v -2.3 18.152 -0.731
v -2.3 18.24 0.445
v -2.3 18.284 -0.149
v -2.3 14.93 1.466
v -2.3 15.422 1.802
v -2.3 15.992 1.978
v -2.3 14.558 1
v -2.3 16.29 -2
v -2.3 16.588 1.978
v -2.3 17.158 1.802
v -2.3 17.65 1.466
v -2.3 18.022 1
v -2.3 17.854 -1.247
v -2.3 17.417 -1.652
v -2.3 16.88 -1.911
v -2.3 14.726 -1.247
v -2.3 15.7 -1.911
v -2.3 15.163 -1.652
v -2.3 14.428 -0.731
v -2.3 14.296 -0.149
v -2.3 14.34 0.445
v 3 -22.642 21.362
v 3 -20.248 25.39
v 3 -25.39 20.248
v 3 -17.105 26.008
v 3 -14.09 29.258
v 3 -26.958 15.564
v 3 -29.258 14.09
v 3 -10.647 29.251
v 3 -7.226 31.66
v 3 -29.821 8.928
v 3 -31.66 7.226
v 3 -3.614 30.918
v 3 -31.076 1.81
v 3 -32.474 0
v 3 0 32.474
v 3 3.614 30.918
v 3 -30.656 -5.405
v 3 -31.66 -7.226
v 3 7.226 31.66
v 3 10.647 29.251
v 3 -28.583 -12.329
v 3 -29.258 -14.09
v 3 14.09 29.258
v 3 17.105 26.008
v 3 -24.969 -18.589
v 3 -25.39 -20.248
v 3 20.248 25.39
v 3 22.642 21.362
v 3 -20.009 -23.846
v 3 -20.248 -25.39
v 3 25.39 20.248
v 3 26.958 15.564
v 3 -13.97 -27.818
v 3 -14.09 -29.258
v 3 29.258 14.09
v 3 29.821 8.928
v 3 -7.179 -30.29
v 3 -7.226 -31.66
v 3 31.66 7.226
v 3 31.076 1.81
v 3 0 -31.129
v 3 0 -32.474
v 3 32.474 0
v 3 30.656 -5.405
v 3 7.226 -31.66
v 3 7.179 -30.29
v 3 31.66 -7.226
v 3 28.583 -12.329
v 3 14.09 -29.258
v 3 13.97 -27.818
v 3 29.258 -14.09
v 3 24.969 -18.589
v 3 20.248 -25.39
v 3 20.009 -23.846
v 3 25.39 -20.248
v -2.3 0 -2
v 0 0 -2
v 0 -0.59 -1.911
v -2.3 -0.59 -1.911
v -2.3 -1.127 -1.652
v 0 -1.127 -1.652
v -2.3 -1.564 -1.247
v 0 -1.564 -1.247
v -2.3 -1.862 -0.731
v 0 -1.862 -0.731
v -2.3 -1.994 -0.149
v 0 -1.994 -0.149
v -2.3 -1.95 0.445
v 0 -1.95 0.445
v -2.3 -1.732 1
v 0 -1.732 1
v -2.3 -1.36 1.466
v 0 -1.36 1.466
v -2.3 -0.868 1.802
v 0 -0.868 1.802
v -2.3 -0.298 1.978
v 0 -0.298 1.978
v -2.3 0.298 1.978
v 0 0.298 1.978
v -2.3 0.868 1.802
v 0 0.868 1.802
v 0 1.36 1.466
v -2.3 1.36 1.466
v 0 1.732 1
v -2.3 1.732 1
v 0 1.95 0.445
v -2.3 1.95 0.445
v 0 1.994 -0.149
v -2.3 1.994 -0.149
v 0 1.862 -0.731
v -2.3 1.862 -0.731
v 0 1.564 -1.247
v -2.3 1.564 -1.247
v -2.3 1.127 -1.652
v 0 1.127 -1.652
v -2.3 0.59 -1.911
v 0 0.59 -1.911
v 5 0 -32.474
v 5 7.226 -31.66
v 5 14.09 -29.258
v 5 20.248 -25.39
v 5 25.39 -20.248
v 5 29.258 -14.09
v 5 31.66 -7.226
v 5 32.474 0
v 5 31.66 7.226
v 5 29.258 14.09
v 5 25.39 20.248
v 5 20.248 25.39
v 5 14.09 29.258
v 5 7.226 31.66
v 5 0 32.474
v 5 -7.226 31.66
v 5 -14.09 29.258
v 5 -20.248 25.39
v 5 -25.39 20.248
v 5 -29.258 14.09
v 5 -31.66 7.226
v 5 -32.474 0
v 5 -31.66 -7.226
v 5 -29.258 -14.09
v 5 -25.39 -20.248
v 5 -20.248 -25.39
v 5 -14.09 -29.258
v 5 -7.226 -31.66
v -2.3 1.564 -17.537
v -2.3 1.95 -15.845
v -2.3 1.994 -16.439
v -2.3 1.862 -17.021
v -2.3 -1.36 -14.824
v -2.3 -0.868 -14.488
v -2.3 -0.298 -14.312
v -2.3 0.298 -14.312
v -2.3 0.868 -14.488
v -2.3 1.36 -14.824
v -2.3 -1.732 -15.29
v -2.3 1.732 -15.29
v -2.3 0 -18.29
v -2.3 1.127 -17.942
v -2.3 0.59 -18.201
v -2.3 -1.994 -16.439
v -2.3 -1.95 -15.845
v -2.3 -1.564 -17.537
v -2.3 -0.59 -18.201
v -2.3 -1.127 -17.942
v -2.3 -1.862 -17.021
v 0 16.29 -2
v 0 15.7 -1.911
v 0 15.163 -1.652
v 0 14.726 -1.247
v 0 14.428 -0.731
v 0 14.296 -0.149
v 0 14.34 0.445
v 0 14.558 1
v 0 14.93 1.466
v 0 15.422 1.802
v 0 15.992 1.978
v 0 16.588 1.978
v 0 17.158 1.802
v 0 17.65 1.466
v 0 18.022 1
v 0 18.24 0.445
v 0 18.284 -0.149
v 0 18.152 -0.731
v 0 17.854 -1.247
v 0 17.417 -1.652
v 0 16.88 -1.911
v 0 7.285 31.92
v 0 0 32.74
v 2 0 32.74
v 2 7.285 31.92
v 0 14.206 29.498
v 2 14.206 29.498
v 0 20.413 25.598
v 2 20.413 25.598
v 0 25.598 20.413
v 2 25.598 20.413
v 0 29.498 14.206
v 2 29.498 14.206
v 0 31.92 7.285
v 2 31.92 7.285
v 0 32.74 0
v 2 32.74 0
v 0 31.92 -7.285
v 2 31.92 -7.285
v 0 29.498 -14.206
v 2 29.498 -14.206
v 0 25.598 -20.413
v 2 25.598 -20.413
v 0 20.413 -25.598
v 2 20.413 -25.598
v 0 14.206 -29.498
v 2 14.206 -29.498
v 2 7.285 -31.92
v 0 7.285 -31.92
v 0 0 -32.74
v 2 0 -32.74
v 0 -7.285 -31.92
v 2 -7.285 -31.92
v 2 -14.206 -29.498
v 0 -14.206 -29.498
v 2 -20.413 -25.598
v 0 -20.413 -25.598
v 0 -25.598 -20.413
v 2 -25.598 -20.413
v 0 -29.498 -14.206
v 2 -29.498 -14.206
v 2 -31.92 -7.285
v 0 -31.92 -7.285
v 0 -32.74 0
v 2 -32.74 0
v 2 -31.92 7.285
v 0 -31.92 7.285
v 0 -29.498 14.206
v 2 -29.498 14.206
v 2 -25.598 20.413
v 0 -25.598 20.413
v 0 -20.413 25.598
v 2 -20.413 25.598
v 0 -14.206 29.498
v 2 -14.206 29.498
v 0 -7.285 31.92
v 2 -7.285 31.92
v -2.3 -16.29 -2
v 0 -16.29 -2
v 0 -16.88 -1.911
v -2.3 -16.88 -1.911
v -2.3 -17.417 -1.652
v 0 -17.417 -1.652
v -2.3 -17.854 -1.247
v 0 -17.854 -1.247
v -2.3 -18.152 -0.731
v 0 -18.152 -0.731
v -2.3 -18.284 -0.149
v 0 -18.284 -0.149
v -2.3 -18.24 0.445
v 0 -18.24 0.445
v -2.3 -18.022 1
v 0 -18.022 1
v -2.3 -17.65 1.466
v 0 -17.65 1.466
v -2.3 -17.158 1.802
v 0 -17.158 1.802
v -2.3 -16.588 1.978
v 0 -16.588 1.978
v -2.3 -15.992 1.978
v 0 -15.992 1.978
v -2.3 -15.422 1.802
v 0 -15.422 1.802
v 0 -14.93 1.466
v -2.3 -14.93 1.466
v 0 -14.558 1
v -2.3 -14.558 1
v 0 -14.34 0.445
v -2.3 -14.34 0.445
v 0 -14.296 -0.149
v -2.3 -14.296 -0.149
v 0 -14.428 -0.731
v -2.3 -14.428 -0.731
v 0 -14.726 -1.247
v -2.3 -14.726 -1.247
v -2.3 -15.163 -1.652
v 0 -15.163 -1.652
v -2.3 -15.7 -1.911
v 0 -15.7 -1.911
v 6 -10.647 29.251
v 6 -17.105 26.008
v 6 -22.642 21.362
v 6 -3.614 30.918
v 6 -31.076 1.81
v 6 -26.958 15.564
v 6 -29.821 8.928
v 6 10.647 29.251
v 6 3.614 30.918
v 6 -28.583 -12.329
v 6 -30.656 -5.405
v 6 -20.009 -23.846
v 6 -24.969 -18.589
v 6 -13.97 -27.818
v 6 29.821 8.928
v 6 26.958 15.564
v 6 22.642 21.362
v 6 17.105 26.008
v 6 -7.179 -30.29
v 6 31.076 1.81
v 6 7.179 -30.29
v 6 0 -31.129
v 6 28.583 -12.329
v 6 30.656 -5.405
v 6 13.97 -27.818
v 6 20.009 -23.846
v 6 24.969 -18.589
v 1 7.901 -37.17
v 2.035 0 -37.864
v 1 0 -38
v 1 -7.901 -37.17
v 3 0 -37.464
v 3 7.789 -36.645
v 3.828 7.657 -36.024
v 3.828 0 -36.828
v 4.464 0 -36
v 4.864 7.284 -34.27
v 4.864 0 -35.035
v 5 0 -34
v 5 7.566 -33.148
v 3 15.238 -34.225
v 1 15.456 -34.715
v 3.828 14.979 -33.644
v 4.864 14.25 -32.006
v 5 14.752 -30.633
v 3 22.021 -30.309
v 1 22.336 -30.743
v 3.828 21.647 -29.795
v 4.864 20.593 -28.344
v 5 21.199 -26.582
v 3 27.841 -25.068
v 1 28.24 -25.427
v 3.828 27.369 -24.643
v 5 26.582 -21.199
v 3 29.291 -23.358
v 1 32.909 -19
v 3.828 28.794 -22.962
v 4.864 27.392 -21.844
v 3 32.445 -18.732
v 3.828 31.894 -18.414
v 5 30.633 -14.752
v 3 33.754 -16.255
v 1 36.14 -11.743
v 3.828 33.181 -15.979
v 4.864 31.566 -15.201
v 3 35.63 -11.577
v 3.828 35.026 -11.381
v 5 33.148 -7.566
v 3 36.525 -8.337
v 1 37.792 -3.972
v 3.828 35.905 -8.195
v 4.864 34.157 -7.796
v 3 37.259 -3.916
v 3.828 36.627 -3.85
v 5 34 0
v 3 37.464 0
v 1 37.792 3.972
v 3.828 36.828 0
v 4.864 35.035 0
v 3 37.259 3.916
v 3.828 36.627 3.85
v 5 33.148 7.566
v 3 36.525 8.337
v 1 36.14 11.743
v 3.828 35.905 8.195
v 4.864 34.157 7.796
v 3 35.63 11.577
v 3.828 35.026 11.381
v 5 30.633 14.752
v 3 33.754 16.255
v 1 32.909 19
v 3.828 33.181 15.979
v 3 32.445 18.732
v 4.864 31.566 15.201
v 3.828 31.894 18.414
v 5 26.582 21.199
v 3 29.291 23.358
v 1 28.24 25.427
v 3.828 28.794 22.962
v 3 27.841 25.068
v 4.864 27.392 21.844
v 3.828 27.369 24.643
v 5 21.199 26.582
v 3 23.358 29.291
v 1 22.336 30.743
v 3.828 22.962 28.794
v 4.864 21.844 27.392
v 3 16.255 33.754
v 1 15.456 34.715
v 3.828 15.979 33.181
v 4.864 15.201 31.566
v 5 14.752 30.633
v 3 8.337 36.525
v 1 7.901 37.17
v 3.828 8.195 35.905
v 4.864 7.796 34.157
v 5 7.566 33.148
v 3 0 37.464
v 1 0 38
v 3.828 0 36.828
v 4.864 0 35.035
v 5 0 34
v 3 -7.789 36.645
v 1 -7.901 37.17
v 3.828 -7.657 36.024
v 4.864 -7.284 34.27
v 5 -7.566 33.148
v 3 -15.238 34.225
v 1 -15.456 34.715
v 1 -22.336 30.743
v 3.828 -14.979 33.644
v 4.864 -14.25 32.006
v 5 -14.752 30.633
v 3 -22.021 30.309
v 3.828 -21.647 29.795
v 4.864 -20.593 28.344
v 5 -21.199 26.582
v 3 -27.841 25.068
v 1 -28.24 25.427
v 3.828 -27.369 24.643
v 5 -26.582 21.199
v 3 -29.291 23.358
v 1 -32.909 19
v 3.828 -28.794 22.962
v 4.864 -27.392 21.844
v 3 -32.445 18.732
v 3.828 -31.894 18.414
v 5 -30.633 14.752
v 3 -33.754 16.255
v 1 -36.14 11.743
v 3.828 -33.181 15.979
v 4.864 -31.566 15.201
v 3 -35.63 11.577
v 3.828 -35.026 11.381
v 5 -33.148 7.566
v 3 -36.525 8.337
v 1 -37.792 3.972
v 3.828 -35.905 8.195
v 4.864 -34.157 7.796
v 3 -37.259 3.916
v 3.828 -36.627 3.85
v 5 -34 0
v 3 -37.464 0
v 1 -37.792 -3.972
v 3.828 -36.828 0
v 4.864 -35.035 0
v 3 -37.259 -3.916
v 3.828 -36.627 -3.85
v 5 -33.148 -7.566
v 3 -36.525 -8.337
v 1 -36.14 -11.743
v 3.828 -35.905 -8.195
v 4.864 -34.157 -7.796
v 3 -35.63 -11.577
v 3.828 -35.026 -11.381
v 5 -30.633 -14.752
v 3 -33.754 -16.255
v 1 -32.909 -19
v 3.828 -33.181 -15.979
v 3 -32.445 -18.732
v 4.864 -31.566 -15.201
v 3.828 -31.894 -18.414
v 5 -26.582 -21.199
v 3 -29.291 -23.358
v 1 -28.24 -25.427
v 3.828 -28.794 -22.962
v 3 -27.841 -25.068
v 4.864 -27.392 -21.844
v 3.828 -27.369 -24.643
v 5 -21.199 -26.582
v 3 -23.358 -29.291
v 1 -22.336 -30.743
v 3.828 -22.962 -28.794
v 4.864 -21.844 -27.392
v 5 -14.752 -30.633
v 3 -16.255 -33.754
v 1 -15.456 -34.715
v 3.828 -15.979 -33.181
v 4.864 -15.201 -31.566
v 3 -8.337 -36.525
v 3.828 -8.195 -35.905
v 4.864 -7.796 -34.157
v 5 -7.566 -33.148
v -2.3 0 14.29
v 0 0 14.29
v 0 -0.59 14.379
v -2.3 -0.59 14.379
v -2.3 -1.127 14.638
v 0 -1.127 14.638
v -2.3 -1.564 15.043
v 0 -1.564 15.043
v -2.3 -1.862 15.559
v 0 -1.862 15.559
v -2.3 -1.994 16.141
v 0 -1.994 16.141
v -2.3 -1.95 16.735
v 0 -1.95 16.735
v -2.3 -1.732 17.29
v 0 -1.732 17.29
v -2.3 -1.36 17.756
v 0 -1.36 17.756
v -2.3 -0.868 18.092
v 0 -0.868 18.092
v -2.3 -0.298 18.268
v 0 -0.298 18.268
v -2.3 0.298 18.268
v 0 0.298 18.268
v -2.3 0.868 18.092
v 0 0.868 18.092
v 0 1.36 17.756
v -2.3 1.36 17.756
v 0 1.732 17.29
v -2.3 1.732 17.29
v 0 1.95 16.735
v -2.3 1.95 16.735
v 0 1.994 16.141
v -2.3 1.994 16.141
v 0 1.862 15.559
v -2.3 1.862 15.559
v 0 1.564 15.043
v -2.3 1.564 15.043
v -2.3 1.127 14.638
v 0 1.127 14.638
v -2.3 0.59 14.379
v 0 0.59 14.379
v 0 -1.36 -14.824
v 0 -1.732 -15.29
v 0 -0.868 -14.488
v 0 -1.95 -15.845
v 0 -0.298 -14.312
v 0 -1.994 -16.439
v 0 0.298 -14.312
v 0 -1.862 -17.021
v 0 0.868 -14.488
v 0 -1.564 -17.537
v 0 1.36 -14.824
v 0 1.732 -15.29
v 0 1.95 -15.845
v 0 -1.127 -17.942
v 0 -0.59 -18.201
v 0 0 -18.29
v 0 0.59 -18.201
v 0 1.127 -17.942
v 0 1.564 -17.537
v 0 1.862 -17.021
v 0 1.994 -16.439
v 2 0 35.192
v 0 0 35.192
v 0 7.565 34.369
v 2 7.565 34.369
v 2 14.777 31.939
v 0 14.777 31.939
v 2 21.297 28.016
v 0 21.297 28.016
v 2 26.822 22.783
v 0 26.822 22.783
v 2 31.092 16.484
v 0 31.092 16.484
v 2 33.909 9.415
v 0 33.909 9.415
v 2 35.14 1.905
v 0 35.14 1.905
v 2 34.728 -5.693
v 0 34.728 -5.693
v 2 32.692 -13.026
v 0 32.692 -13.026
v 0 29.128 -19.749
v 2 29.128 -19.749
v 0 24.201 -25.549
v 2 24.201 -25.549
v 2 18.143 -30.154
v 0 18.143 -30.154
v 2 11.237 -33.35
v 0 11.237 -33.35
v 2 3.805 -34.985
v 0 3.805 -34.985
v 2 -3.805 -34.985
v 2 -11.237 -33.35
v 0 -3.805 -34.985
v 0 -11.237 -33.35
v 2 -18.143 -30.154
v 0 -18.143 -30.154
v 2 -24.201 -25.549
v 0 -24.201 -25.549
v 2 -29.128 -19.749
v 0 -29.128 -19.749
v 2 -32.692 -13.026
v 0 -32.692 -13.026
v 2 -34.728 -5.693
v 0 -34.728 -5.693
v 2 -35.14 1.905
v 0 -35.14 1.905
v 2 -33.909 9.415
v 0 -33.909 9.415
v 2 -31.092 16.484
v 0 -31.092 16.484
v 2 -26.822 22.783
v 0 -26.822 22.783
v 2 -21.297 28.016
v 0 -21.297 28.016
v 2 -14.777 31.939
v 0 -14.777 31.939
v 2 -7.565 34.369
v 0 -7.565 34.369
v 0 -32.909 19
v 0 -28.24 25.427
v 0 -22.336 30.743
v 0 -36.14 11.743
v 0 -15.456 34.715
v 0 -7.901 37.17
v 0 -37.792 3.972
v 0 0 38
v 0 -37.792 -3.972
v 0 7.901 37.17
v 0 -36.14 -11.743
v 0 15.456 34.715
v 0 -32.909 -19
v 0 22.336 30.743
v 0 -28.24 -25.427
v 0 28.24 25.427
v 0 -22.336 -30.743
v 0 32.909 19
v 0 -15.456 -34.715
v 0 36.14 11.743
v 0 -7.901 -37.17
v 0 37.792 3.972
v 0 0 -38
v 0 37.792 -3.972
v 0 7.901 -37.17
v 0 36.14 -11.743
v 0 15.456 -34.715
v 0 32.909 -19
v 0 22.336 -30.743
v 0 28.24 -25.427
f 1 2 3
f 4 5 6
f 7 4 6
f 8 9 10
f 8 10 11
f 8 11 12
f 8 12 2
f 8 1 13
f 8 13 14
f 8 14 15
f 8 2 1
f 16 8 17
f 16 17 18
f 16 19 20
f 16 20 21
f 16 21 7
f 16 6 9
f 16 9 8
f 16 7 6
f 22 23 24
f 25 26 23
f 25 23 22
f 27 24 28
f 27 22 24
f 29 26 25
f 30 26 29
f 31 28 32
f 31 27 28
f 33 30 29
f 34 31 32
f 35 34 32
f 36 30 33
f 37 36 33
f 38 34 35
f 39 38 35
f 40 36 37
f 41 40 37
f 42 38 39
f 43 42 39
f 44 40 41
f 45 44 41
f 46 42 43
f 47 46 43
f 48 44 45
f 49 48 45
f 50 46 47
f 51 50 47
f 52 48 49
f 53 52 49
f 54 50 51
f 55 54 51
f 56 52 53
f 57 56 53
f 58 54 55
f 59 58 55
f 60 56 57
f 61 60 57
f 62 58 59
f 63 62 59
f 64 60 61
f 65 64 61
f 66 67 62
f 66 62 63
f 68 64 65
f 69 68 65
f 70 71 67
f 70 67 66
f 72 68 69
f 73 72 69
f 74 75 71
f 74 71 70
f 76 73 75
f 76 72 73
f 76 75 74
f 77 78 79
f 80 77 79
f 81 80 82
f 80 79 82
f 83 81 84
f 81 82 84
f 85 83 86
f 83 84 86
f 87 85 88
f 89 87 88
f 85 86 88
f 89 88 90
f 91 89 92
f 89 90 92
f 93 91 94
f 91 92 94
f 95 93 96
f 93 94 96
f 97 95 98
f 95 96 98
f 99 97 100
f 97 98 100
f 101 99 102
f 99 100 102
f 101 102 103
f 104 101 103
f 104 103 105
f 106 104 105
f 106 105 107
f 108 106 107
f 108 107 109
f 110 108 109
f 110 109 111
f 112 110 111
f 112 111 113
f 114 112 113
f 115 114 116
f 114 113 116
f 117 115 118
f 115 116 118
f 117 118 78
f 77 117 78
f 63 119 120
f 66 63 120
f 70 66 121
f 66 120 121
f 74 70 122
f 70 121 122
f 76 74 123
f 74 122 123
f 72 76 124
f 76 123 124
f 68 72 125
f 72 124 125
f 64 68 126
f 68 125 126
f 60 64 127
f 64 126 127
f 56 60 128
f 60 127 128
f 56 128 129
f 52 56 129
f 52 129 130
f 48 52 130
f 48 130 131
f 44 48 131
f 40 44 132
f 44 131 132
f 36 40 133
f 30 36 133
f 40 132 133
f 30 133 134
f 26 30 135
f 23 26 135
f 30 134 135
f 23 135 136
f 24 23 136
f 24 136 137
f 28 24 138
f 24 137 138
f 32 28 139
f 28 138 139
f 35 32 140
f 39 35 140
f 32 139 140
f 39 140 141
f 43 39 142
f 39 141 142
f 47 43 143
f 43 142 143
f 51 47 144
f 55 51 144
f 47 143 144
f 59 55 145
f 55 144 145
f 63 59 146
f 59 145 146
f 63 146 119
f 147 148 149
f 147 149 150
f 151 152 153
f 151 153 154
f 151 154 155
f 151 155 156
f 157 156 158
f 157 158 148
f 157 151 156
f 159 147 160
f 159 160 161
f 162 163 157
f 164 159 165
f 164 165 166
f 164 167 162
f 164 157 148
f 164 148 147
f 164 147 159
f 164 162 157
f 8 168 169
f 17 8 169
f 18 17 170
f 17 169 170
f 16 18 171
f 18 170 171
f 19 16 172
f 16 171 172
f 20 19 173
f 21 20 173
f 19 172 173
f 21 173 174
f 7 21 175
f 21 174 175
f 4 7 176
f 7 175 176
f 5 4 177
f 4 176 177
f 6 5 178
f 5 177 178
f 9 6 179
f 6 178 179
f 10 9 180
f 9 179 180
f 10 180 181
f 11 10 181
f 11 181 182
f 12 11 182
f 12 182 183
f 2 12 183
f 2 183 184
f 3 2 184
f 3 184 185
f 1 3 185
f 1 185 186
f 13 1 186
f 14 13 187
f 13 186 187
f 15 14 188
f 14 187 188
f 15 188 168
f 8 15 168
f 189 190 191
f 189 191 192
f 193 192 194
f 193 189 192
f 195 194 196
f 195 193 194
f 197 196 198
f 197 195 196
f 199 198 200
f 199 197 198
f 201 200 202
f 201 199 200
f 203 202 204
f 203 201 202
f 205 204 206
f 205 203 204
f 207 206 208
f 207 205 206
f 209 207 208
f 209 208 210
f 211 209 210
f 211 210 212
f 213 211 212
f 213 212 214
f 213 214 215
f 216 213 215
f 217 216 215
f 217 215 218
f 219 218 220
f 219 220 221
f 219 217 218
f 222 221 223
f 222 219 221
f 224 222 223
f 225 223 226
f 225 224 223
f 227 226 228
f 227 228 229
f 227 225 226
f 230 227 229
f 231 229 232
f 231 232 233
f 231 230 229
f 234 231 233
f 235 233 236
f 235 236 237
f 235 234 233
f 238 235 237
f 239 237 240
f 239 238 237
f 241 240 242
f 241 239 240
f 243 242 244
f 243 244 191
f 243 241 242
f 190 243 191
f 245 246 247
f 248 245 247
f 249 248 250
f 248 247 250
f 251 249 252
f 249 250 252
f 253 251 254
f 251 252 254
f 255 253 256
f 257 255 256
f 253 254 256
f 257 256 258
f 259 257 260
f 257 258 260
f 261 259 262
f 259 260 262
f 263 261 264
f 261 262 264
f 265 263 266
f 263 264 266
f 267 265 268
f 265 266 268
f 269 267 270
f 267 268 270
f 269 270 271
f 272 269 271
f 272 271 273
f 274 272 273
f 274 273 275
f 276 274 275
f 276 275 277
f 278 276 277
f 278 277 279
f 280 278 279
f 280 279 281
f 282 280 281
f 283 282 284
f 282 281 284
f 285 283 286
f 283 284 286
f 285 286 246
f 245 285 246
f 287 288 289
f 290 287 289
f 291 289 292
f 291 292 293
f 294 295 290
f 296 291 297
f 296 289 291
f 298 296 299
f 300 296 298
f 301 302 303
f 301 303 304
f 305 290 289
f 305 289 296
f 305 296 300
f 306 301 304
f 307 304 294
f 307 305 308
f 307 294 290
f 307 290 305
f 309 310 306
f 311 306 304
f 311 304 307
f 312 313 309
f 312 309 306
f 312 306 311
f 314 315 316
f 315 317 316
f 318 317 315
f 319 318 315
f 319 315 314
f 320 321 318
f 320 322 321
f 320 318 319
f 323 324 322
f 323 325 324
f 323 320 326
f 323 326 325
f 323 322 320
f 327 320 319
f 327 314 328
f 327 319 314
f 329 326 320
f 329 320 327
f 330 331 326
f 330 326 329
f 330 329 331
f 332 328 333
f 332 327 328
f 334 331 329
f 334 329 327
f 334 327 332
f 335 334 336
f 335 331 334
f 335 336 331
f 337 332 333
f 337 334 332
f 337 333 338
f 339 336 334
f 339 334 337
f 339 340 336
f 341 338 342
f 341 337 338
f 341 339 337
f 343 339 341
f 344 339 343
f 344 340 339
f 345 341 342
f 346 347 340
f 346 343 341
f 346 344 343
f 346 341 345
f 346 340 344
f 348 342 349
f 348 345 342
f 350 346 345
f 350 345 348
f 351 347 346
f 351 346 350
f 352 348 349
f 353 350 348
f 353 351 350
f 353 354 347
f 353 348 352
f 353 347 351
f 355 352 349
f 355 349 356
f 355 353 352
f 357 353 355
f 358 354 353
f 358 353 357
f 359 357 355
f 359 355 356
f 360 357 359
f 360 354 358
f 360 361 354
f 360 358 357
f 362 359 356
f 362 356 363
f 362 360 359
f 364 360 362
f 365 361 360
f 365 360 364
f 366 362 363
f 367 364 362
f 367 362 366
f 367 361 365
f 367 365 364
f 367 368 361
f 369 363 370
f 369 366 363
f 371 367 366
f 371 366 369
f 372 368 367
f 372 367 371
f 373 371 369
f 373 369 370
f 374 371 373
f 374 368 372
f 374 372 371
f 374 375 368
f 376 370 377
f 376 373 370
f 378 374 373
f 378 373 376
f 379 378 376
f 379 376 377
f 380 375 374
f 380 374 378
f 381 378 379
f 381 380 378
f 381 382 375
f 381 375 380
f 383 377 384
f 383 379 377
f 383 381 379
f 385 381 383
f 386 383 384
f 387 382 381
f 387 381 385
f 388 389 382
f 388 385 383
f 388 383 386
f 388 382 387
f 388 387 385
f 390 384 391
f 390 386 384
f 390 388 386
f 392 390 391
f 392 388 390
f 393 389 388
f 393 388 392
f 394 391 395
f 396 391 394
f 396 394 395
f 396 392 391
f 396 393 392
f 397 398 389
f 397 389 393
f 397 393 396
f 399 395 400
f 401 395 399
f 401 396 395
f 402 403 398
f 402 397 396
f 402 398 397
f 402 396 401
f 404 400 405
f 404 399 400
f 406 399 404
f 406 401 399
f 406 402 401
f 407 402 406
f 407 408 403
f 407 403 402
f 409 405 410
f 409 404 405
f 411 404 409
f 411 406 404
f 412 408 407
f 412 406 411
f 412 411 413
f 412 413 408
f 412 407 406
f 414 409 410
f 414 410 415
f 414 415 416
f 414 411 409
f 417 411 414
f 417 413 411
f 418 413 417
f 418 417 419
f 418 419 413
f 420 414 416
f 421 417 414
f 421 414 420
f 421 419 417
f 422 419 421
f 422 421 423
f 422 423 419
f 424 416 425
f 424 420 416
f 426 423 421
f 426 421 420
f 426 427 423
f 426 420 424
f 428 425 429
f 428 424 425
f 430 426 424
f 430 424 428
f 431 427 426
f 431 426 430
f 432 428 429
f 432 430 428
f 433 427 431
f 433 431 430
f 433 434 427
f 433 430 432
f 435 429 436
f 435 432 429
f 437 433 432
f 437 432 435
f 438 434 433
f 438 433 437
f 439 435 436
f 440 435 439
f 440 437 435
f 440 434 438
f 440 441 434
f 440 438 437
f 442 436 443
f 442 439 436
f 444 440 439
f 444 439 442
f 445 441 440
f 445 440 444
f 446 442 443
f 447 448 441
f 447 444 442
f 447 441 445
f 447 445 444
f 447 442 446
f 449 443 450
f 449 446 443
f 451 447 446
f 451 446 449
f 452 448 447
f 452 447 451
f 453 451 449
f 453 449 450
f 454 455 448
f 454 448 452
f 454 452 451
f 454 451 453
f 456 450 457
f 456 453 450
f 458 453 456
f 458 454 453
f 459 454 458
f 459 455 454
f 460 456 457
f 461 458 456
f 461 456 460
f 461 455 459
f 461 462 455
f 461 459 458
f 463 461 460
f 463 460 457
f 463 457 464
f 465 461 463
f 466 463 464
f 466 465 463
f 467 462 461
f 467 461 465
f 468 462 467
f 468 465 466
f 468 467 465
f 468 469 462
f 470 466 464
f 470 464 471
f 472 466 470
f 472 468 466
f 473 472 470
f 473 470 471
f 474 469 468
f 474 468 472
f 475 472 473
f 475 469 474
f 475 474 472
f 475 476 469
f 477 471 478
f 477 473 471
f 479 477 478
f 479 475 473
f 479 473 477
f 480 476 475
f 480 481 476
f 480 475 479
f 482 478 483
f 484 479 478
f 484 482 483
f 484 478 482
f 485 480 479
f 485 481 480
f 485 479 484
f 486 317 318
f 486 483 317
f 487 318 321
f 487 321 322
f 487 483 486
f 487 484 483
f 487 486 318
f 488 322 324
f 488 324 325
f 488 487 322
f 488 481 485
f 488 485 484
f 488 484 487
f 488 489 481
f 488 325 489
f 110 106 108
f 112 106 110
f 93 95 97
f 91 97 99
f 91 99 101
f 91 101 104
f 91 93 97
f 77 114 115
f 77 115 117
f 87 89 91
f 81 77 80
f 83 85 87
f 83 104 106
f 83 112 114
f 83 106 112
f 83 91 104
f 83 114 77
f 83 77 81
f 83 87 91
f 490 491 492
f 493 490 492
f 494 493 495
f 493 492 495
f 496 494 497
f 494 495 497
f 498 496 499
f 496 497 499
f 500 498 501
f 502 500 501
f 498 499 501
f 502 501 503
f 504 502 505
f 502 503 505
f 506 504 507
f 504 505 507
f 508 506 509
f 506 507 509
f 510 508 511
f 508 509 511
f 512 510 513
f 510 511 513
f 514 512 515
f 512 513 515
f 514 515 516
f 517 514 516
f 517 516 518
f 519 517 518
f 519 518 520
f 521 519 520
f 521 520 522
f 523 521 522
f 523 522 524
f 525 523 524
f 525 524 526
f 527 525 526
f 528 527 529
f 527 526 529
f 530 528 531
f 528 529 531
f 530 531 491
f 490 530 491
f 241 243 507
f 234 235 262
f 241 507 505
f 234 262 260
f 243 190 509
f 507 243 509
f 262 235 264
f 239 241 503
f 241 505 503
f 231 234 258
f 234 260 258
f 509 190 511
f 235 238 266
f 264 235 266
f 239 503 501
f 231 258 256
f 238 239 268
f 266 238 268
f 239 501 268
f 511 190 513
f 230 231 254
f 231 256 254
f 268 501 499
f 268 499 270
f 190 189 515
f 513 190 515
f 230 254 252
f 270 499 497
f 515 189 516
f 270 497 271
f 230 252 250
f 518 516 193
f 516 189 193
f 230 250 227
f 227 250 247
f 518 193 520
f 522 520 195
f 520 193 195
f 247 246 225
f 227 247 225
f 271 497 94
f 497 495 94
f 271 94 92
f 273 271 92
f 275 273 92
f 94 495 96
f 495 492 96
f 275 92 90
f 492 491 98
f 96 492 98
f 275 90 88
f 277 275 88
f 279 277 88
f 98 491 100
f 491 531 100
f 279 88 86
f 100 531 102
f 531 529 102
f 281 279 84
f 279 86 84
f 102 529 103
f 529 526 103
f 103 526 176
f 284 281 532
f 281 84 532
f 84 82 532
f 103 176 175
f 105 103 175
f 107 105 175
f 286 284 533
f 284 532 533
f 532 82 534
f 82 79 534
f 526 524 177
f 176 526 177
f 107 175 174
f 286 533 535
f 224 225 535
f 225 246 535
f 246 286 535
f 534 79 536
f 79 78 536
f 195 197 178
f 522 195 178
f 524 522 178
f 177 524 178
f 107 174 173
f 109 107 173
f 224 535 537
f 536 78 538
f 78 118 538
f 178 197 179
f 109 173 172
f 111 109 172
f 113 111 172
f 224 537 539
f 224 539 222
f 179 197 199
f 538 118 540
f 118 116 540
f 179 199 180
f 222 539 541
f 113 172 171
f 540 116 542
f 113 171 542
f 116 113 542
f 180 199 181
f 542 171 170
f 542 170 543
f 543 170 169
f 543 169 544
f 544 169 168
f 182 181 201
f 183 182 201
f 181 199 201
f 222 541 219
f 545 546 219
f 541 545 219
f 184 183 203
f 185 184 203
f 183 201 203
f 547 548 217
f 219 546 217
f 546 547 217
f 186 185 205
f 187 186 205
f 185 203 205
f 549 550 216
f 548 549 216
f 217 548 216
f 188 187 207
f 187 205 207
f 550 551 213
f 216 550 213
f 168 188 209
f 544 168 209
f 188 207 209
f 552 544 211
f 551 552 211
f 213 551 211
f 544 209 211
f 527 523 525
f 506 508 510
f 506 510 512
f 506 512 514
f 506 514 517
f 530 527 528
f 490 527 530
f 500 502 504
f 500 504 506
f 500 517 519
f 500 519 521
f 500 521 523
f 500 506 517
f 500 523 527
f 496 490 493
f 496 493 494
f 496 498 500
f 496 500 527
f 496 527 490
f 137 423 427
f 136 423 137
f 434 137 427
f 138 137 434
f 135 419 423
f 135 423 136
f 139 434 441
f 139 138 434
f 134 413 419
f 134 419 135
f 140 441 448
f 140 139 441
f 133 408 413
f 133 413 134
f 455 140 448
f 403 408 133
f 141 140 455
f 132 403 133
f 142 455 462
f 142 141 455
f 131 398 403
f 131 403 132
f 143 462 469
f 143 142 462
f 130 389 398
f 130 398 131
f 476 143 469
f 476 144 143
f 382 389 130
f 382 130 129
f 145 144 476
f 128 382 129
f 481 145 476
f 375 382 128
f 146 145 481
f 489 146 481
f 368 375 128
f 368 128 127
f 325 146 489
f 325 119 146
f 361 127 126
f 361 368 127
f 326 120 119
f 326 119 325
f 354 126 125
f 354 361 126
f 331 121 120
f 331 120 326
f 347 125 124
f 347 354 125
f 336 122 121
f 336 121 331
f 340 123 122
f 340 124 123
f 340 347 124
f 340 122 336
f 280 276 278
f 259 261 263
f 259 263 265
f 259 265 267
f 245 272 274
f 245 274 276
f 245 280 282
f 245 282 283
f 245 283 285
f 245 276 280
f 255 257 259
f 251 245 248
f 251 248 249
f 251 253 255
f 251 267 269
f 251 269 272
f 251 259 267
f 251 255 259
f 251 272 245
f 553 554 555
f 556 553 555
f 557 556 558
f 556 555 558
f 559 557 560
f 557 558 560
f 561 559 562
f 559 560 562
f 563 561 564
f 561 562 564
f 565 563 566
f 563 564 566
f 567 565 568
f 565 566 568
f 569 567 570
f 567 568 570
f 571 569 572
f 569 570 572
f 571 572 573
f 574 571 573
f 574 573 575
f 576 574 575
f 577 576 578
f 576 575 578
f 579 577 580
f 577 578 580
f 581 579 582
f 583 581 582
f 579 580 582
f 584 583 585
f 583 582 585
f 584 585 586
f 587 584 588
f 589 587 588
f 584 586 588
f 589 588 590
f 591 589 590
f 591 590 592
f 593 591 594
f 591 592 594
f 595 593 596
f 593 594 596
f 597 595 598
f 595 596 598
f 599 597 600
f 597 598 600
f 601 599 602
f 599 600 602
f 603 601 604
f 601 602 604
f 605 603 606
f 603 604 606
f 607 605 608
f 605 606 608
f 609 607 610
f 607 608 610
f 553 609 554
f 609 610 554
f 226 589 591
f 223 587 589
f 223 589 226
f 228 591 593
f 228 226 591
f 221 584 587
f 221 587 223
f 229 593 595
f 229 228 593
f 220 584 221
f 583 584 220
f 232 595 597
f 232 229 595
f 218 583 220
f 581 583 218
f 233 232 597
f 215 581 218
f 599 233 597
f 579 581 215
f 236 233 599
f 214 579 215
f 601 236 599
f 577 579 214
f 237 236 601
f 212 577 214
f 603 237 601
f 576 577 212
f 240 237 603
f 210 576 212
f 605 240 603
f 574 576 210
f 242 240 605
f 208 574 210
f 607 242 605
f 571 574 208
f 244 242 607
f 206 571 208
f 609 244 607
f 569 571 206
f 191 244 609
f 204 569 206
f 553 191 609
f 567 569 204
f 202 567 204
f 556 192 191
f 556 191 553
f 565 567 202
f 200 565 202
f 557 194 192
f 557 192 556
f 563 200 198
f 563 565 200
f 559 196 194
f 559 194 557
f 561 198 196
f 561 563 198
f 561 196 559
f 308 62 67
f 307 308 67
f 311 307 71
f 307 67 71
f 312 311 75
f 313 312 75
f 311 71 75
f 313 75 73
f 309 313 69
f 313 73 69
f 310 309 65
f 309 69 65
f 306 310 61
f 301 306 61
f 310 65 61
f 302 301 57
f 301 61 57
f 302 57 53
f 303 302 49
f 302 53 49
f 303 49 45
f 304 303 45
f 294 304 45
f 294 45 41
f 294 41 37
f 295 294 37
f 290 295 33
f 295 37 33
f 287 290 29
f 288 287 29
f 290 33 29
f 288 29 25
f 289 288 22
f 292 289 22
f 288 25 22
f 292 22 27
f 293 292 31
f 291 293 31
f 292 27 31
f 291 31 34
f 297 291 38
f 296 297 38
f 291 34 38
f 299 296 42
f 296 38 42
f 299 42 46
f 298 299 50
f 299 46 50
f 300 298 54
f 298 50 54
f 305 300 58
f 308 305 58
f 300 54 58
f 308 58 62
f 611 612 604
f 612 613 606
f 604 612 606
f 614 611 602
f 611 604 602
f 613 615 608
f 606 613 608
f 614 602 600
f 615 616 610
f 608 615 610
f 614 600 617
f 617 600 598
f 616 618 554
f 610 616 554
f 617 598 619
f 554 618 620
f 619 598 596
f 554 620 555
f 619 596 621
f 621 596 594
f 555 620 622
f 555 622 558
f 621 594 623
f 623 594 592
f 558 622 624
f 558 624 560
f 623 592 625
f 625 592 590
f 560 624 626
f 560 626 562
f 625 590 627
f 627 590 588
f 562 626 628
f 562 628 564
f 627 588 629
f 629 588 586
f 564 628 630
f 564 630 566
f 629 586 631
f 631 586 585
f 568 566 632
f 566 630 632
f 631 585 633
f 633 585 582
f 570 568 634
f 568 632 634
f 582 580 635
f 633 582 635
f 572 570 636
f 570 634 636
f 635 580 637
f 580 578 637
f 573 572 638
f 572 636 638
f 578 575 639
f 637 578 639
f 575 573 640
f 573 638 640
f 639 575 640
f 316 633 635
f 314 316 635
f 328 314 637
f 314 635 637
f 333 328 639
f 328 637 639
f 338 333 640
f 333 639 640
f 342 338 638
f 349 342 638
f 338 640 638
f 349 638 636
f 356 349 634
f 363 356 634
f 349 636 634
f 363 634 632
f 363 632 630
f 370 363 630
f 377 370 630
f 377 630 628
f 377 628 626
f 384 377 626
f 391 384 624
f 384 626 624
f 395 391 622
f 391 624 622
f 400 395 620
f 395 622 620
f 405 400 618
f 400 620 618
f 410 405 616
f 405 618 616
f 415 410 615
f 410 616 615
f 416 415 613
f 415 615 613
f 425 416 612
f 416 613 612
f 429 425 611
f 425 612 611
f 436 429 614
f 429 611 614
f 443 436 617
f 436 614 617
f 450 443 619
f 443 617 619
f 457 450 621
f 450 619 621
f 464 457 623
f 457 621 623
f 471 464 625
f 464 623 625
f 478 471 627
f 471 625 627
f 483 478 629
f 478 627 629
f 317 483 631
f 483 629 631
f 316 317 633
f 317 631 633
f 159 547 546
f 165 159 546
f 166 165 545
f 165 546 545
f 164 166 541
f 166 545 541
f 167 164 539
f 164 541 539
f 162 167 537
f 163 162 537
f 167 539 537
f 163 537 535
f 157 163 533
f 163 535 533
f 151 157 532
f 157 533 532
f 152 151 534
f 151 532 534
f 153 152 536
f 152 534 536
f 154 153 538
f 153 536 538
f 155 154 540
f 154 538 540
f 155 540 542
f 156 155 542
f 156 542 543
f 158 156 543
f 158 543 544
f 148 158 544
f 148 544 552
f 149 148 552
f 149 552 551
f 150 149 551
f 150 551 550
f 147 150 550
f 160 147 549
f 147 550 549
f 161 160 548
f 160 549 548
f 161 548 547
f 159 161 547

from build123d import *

# Parameters (mm, degrees)
SKETCH1_R           = 38
BOSS_EXTRUDE1_DEPTH = 5
FILLET1_R           = 4
SKETCH2_R           = 2
BOSS_EXTRUDE2_DEPTH = 2.3
SKETCH3_R           = 32.474473425
CUT_EXTRUDE1_DEPTH  = 2
SKETCH4_R           = 35.191697817
SKETCH4_R_2         = 32.740433986
CUT_EXTRUDE2_DEPTH  = 2
SKETCH5_R           = 31.128585578
BOSS_EXTRUDE3_DEPTH = 3


with BuildPart() as part:
    # Sketch1 → Boss-Extrude1 (new body)
    with BuildSketch(Plane(origin=(0, 0, 0), x_dir=(0, 0, -1), z_dir=(1, 0, 0))):
        Circle(SKETCH1_R)
    extrude(amount=BOSS_EXTRUDE1_DEPTH)

    # Fillet1
    fillet1_edges = [part.edges().sort_by_distance(p)[0] for p in [
        (5, 0, 38),
    ]]
    fillet(fillet1_edges, radius=FILLET1_R)

    # Sketch2 → Boss-Extrude2 (add)
    with BuildSketch(Plane.ZY):
        with Locations(Location((0, 0, 0), (0, 0, 180))):
            Circle(SKETCH2_R)
        with Locations(Location((0, 16.29, 0), (0, 0, 180))):
            Circle(SKETCH2_R)
        with Locations(Location((16.29, 0, 0), (0, 0, 180))):
            Circle(SKETCH2_R)
        with Locations(Location((-16.29, 0, 0), (0, 0, 180))):
            Circle(SKETCH2_R)
        with Locations(Location((0, -16.29, 0), (0, 0, 180))):
            Circle(SKETCH2_R)
    extrude(amount=BOSS_EXTRUDE2_DEPTH)

    # Sketch3 → Cut-Extrude1 (cut)
    with BuildSketch(Plane(origin=(5, 0, 0), x_dir=(0, 0, -1), z_dir=(1, 0, 0))):
        Circle(SKETCH3_R)
    extrude(amount=-CUT_EXTRUDE1_DEPTH, mode=Mode.SUBTRACT)

    # Sketch4 → Cut-Extrude2 (cut)
    with BuildSketch(Plane.ZY):
        Circle(SKETCH4_R)
        Circle(SKETCH4_R_2, mode=Mode.SUBTRACT)
    extrude(amount=-CUT_EXTRUDE2_DEPTH, mode=Mode.SUBTRACT)

    # Sketch5 → Boss-Extrude3 (add)
    with BuildSketch(Plane(origin=(3, 0, 0), x_dir=(0, 0, -1), z_dir=(1, 0, 0))):
        Circle(SKETCH5_R)
    extrude(amount=BOSS_EXTRUDE3_DEPTH)


solid = part.part
